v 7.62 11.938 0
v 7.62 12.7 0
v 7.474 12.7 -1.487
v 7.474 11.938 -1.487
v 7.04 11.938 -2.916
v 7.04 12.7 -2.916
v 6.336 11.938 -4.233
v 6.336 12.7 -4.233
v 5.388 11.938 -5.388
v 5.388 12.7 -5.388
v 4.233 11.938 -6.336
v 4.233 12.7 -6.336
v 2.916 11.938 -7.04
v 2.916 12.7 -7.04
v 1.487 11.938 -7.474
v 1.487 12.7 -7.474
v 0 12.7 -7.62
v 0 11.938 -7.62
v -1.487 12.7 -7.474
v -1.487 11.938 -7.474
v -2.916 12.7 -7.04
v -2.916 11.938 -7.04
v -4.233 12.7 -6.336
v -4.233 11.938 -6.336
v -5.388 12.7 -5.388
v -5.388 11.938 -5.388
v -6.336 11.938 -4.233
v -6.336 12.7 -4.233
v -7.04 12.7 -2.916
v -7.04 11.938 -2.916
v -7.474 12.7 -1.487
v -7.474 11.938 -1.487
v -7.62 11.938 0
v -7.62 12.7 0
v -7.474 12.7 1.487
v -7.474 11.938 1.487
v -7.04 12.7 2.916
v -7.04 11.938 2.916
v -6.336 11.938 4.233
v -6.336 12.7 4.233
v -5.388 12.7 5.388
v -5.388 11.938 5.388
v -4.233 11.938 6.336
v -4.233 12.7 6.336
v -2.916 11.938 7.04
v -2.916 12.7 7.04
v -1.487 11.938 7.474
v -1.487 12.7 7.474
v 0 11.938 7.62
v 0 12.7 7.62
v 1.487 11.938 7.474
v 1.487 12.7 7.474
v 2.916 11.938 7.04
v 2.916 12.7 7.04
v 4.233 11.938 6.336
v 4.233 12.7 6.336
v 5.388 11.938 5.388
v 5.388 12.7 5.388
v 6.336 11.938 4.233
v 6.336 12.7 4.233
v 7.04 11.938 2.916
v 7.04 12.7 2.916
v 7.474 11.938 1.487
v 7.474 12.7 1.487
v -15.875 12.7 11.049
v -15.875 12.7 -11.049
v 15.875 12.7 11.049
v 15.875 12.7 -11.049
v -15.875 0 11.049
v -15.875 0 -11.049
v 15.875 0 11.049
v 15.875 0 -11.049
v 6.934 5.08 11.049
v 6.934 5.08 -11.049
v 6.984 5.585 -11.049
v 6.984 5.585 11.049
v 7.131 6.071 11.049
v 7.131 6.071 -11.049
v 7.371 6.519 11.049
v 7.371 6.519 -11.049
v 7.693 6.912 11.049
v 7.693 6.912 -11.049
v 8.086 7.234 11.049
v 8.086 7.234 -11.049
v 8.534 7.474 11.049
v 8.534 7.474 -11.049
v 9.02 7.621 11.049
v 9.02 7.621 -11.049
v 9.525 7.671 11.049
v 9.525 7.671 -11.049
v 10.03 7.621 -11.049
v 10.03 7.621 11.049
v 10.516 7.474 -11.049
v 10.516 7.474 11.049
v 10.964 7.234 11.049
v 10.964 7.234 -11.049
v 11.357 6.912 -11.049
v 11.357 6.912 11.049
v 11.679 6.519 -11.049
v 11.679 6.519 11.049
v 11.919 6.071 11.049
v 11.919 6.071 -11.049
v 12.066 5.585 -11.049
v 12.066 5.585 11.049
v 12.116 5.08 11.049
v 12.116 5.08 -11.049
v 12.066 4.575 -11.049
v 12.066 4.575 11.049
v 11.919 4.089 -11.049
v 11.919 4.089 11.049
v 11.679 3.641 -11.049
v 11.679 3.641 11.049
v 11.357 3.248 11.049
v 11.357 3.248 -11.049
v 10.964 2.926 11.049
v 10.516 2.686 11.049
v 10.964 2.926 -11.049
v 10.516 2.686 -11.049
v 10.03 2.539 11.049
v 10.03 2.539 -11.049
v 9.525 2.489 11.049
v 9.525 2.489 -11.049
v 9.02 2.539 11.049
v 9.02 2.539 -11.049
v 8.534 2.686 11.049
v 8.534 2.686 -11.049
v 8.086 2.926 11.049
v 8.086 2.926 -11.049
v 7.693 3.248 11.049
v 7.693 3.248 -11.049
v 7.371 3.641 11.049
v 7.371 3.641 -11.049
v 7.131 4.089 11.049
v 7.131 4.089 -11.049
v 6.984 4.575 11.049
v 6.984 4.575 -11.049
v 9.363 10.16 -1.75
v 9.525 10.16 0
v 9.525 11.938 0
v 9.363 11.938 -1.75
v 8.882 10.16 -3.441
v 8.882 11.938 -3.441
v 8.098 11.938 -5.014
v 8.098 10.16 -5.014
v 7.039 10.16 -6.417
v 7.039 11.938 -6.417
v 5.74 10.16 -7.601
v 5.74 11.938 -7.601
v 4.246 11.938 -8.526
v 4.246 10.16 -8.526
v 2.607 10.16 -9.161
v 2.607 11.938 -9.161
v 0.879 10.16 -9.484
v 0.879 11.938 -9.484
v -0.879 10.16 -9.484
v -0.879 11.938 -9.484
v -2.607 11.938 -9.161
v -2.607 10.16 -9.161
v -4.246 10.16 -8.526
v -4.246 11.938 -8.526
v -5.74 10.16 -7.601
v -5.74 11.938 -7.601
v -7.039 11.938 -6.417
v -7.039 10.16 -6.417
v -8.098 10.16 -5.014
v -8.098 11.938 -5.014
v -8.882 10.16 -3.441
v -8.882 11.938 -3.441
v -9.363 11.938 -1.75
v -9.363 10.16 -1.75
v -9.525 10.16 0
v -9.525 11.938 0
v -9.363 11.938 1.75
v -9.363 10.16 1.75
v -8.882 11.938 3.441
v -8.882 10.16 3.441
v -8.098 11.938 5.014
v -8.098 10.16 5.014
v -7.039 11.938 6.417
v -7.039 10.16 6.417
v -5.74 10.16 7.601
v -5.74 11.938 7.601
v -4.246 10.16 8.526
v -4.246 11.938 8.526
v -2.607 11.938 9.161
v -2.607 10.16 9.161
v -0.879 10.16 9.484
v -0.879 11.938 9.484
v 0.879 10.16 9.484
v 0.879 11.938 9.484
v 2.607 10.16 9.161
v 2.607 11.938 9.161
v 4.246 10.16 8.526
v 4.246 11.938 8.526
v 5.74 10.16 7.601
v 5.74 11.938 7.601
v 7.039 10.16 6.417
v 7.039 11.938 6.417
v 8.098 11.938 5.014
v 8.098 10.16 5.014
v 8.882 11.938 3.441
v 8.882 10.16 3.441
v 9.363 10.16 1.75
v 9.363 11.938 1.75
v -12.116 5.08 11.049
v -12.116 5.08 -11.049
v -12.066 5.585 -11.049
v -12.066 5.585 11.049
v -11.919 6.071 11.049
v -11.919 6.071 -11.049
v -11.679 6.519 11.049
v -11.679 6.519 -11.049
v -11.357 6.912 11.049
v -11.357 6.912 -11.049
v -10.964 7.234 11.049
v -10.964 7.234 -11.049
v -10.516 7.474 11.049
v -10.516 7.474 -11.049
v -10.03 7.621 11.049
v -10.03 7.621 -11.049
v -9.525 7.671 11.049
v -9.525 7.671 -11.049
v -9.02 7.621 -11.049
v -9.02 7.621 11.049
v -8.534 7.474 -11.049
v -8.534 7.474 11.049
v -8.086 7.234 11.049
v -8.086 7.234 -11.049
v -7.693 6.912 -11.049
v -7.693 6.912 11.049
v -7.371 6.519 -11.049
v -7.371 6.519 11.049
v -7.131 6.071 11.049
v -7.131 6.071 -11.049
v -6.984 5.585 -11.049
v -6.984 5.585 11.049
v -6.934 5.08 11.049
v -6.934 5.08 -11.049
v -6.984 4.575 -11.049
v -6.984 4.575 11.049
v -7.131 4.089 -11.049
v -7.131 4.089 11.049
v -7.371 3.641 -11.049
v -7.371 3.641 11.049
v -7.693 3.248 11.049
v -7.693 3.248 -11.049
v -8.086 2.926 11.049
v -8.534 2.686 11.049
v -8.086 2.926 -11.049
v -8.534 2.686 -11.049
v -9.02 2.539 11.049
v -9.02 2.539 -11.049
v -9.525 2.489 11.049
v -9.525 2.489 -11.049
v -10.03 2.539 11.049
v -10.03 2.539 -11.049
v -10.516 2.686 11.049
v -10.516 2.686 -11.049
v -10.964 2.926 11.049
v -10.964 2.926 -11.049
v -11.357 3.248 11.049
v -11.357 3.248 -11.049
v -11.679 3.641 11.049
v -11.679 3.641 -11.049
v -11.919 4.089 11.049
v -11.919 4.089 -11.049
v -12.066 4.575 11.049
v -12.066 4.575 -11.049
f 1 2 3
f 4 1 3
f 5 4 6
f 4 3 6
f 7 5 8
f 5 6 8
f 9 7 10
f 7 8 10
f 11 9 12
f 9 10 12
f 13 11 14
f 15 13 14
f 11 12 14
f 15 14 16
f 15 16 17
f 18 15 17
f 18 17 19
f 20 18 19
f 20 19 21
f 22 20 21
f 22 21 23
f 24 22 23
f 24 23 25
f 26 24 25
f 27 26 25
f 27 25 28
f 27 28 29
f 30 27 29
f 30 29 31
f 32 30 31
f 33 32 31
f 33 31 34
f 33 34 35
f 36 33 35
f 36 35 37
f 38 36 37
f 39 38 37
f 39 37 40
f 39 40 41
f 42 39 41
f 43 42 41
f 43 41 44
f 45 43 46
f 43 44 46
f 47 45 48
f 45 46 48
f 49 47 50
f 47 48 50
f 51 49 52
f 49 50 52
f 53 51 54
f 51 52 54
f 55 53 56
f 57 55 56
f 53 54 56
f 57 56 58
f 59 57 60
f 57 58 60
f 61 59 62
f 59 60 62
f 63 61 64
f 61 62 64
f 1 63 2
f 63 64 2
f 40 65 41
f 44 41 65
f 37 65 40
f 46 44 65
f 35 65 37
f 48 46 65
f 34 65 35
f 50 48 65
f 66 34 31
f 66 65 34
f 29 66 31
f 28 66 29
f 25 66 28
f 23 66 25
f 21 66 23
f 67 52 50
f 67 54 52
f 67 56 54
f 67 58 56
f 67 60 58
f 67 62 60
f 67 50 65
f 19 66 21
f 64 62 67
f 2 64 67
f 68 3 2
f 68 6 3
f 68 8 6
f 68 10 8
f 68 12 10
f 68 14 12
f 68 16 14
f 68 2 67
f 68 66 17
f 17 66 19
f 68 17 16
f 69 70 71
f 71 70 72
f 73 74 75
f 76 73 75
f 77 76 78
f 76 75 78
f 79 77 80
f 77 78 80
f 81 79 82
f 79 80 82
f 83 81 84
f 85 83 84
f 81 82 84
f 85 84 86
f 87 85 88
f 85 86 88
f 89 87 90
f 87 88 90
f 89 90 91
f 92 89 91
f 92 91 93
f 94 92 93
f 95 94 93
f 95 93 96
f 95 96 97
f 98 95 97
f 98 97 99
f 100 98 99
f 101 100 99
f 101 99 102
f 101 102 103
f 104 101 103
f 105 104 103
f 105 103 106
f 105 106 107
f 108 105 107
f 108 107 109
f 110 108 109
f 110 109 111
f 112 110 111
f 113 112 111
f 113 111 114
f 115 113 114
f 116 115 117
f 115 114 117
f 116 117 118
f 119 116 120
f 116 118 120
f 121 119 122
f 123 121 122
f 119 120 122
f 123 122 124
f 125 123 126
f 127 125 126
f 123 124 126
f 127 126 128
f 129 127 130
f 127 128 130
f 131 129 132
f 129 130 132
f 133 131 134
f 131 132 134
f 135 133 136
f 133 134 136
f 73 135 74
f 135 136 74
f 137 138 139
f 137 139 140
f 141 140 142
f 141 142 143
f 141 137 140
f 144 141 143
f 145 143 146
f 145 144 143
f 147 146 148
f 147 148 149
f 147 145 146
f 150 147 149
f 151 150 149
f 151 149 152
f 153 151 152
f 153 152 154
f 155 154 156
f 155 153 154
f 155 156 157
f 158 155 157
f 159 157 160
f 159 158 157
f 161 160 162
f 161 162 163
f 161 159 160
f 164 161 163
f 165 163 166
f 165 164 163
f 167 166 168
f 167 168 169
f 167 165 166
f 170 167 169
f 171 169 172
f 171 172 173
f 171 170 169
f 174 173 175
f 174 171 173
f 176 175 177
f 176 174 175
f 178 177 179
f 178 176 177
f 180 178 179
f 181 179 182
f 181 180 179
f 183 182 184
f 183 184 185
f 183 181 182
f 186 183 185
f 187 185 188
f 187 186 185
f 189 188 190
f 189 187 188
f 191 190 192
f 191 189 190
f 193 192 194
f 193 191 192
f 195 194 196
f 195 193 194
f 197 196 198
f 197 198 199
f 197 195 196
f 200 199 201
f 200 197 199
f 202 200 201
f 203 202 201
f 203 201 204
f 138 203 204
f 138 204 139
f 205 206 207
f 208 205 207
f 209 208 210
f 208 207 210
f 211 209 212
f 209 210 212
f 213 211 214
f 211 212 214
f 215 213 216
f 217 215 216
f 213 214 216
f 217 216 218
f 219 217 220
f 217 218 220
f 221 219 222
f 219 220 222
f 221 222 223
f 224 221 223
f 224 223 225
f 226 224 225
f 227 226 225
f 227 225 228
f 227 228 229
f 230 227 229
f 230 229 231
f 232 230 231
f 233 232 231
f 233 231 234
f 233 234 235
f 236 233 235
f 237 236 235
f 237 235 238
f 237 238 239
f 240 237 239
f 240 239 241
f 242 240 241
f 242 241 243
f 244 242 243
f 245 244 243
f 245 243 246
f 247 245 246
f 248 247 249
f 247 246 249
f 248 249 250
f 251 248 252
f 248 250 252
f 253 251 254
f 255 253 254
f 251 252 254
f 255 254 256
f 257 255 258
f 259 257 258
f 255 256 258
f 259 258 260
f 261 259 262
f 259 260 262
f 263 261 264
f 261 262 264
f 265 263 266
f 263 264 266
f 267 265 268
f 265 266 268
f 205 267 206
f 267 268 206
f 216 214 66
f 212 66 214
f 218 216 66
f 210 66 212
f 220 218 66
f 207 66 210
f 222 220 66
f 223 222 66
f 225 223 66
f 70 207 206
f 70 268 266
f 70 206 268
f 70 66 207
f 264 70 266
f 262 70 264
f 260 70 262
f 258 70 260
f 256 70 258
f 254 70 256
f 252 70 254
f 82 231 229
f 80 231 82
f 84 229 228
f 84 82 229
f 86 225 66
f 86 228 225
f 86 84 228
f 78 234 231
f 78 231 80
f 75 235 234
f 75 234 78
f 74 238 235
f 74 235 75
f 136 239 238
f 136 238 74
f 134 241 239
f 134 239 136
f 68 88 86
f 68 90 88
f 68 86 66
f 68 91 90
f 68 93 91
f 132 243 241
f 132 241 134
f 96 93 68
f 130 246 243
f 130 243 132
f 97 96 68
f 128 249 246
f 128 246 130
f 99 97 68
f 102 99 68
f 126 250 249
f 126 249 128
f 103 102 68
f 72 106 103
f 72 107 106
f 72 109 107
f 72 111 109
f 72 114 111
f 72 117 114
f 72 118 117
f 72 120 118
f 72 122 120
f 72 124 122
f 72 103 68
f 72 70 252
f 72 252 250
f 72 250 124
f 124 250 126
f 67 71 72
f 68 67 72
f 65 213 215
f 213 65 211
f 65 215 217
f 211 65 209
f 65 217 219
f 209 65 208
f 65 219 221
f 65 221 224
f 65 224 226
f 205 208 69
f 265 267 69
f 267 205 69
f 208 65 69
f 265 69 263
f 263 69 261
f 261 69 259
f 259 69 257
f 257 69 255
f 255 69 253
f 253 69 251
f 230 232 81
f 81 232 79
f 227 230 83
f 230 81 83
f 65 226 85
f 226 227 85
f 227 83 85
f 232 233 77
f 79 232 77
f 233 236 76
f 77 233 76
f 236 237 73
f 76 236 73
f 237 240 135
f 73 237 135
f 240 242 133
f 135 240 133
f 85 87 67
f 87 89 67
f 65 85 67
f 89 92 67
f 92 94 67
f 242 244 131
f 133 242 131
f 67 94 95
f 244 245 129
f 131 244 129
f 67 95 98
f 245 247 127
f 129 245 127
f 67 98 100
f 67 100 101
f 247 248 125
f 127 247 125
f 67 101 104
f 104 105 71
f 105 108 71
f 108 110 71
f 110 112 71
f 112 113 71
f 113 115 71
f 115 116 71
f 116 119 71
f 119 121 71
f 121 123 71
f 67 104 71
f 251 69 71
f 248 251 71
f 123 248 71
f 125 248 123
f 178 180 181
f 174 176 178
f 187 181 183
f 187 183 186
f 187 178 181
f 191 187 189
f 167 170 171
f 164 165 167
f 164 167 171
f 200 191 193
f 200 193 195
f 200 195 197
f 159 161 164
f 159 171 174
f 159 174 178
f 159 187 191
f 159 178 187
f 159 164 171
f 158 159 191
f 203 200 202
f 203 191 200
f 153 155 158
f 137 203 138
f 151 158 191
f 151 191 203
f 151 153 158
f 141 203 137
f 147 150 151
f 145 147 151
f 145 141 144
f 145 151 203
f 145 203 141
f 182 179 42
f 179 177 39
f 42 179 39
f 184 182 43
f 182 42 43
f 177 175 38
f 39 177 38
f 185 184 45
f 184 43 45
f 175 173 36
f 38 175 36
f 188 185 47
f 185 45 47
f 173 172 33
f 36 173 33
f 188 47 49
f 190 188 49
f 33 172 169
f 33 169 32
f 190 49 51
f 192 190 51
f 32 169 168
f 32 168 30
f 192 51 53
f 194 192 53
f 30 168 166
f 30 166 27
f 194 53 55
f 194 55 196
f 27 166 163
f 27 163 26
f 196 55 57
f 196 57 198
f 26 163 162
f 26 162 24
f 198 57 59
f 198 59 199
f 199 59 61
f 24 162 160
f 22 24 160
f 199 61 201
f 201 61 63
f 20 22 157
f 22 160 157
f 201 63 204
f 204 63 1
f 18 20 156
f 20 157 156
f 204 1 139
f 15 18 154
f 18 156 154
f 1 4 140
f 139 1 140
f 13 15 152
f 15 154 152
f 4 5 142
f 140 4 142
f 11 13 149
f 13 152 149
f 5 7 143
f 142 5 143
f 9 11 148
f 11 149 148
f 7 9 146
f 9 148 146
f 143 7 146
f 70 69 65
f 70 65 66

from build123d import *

# Parameters (mm, degrees)
SKETCH1_W                  = 31.75
SKETCH1_H                  = 22.098
BOSS_EXTRUDE1_DEPTH        = 12.7
SKETCH2_R                  = 9.525
CUT_EXTRUDE1_DEPTH         = 1.778
F_6_0_204_DIAMETER_HOLE1_D = 5.1816
CUT_EXTRUDE2_REACH         = 14.7
SKETCH5_R                  = 7.62


with BuildPart() as part:
    # Sketch1 → Boss-Extrude1 (new body)
    with BuildSketch(Plane(origin=(0, 0, 0), x_dir=(1, 0, 0), z_dir=(0, 1, 0))):
        Rectangle(SKETCH1_W, SKETCH1_H)
    extrude(amount=BOSS_EXTRUDE1_DEPTH)

    # Sketch2 → Cut-Extrude1 (cut)
    with BuildSketch(Plane(origin=(0, 10.16, 0), x_dir=(1, 0, 0), z_dir=(0, 1, 0))):
        Circle(SKETCH2_R)
    extrude(amount=CUT_EXTRUDE1_DEPTH, mode=Mode.SUBTRACT)

    # #6 (0.204) Diameter Hole1 (through all)
    with Locations(Plane.XY.offset(11.049)):
        with Locations((-9.525, 5.08), (9.525, 5.08)):
            Hole(F_6_0_204_DIAMETER_HOLE1_D / 2)

    # Sketch5 → Cut-Extrude2 (cut, up to next)
    with BuildSketch(Plane(origin=(0, 12.7, 0), x_dir=(1, 0, 0), z_dir=(0, 1, 0)), mode=Mode.PRIVATE) as cut_extrude2_sk1:
        Circle(SKETCH5_R)
    cut_extrude2_tool1 = extrude(cut_extrude2_sk1.sketch, amount=-CUT_EXTRUDE2_REACH, mode=Mode.PRIVATE) & part.part
    add(cut_extrude2_tool1.solids().sort_by_distance((0, 12.7, 0))[0], mode=Mode.SUBTRACT)


solid = part.part
